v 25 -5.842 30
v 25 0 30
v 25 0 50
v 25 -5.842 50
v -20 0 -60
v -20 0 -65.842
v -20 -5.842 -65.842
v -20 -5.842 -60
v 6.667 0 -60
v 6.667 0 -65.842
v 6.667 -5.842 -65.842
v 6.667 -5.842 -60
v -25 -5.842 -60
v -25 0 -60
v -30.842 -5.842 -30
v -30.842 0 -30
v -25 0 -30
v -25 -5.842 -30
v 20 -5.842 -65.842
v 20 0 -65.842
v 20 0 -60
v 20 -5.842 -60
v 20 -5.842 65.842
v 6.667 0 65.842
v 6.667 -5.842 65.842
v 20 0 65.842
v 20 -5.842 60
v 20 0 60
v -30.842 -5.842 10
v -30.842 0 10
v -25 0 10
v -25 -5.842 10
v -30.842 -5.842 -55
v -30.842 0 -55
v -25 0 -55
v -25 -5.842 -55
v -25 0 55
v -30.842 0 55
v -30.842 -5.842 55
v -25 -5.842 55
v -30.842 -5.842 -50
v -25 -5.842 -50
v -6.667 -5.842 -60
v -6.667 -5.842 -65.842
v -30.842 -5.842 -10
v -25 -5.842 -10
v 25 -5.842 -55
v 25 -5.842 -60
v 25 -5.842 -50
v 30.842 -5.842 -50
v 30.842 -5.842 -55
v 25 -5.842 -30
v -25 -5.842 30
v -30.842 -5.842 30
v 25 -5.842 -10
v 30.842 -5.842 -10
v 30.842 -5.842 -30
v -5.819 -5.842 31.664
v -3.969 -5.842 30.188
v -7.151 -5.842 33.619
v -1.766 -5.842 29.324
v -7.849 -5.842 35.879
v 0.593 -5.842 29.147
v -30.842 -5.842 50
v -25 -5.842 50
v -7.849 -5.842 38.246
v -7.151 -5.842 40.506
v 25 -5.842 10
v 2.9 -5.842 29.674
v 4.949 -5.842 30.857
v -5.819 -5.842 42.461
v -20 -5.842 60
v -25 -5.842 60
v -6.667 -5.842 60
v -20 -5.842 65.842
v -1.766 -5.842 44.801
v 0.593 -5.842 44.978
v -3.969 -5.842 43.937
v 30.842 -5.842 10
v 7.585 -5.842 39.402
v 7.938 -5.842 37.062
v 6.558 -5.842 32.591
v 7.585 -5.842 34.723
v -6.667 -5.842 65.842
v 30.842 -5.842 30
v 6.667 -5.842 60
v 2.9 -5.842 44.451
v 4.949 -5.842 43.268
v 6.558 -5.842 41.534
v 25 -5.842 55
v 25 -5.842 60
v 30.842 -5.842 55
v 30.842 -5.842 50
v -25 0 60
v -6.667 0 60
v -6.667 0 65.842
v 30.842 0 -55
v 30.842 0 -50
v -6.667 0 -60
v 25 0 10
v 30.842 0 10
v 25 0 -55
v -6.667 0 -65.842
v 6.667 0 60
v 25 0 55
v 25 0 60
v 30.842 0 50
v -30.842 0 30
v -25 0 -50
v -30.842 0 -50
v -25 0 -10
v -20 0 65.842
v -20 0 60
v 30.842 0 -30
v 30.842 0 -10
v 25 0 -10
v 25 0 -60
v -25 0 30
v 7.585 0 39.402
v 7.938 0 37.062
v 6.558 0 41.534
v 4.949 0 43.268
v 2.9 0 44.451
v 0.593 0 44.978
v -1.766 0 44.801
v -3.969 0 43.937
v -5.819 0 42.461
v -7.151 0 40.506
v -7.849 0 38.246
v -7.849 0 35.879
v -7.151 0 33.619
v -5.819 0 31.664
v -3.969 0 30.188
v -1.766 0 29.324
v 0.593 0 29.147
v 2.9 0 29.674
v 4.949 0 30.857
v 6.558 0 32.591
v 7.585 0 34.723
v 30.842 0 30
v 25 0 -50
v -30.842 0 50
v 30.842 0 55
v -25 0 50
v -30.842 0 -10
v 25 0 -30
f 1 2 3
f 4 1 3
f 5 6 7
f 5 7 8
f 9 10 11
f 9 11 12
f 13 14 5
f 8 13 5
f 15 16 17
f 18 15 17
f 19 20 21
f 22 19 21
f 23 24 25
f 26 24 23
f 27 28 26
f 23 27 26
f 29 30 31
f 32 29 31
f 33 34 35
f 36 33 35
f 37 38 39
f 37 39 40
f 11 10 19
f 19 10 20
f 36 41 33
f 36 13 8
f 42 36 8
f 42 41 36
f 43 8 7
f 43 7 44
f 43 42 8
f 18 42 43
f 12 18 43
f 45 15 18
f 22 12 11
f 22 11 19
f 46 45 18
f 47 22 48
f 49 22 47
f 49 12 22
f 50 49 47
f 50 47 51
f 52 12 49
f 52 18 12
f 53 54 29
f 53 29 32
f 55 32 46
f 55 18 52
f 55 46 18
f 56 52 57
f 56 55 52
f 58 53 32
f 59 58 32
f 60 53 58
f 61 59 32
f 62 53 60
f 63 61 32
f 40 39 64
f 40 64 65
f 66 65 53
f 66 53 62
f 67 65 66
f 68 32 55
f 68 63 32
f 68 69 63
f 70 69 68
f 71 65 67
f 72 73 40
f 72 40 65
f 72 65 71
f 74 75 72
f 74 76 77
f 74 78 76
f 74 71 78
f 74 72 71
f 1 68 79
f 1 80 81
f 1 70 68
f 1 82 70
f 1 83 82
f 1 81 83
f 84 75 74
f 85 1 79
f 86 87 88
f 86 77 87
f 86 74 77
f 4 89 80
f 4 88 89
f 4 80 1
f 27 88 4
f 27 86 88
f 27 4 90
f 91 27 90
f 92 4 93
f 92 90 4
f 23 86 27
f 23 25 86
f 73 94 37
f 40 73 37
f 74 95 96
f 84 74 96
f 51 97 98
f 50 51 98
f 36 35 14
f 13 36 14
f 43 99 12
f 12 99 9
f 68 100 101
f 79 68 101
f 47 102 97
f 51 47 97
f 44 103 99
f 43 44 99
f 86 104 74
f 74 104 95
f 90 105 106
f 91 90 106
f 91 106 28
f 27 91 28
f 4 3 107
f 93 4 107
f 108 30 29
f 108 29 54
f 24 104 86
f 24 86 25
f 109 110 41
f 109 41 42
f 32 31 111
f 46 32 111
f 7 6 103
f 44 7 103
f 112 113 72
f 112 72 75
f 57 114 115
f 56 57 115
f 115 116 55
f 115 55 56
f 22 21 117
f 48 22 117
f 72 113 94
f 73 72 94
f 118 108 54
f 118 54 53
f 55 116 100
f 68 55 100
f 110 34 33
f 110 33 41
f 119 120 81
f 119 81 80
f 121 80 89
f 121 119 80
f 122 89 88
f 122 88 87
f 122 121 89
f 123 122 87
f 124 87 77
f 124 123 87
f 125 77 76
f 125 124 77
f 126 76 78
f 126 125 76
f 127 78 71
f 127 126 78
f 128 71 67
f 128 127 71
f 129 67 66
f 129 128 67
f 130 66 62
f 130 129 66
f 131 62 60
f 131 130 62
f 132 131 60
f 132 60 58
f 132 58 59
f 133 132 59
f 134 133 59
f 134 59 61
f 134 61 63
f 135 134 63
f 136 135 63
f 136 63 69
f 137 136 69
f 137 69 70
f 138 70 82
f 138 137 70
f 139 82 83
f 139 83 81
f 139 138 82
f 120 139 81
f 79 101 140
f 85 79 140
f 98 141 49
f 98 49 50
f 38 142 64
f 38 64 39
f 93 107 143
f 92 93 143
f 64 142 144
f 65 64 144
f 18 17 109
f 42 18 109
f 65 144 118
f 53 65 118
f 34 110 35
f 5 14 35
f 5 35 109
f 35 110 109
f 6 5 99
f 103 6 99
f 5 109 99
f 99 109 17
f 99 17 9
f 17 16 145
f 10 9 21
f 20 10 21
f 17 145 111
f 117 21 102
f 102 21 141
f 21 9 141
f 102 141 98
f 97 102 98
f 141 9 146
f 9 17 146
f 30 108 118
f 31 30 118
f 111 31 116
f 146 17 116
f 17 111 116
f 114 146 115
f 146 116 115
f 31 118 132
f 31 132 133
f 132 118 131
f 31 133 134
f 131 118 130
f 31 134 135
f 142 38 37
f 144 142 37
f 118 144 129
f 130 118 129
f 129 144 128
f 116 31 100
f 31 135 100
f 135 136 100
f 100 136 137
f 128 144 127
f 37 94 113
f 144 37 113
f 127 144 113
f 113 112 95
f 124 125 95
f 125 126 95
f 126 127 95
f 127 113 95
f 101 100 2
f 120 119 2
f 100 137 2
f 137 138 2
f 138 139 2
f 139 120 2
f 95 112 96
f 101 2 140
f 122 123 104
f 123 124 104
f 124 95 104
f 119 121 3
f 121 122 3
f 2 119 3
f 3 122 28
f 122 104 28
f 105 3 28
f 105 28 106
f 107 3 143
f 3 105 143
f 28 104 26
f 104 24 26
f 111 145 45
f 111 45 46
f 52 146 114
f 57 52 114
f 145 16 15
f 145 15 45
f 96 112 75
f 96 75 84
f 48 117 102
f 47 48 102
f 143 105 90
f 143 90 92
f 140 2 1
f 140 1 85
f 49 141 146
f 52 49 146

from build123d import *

# Parameters (mm, degrees)
F0_R     = 7.9375
F0_W     = 13.333333
F0_H     = 5.842
F0_W_2   = 5.842
F0_H_2   = 5
F0_H_3   = 20
F1_DEPTH = 5.842


with BuildPart() as f1:
    # F0 (on Front) → F1 (new body)
    with BuildSketch(Plane.XZ):
        Polygon((-20, 60), (-25, 60), (-25, 55), (-25, 50), (-25, 30), (-25, 10), (-25, -10), (-25, -30), (-25, -50), (-25, -55), (-25, -60), (-20, -60), (-6.666667, -60), (6.666667, -60), (20, -60), (25, -60), (25, -55), (25, -50), (25, -30), (25, -10), (25, 10), (25, 30), (25, 50), (25, 55), (25, 60), (20, 60), (6.666667, 60), (-6.666667, 60), align=None)
        with Locations((0, 37.0625)):
            Circle(F0_R, mode=Mode.SUBTRACT)
        with Locations((-13.333334, 62.921)):
            Rectangle(F0_W, F0_H)
        with Locations((-27.921, 52.5)):
            Rectangle(F0_W_2, F0_H_2)
        with Locations((13.333334, 62.921)):
            Rectangle(F0_W, F0_H)
        with Locations((-27.921, 20)):
            Rectangle(F0_W_2, F0_H_3)
        with Locations((-27.921, -20)):
            Rectangle(F0_W_2, F0_H_3)
        with Locations((27.921, 52.5)):
            Rectangle(F0_W_2, F0_H_2)
        with Locations((-27.921, -52.5)):
            Rectangle(F0_W_2, F0_H_2)
        with Locations((27.921, 20)):
            Rectangle(F0_W_2, F0_H_3)
        with Locations((27.921, -20)):
            Rectangle(F0_W_2, F0_H_3)
        with Locations((-13.333334, -62.921)):
            Rectangle(F0_W, F0_H)
        with Locations((27.921, -52.5)):
            Rectangle(F0_W_2, F0_H_2)
        with Locations((13.333334, -62.921)):
            Rectangle(F0_W, F0_H)
    extrude(amount=F1_DEPTH)


solid = f1.part
